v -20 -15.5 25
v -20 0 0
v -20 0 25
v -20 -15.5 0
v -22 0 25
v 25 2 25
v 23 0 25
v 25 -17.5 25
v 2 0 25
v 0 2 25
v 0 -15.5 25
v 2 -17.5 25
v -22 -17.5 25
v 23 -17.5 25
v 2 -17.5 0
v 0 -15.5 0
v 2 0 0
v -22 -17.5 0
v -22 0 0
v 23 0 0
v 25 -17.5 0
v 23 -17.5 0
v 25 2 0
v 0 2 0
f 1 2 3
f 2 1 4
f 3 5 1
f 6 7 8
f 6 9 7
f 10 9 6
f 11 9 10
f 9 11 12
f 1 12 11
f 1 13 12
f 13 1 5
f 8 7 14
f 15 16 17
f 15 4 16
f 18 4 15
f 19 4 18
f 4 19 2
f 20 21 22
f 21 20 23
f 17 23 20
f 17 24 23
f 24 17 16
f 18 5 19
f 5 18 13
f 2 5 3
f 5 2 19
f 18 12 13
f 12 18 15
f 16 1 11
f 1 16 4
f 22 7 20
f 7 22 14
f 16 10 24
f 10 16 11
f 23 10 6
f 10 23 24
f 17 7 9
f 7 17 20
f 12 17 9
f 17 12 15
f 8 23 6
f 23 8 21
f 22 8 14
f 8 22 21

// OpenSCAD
/* Simple clip for hanging headsets on the screen
 */

Depth = 17.5;
Width = 23;
Hang = 22;
Thick = 2;
Length = 25;

cube([Width, Thick, Length ]);
translate([0, -1 * Depth, 0]) {
    cube([Thick, Depth, Length]);
}
translate([Width, -1 * Depth, 0]) {
  cube([Thick, Depth + Thick, Length]);
}
translate([-1 * Hang, -1 * Depth, 0]) {
  cube([Thick, Depth, Length]);
  cube([Width, Thick, Length]);
}
